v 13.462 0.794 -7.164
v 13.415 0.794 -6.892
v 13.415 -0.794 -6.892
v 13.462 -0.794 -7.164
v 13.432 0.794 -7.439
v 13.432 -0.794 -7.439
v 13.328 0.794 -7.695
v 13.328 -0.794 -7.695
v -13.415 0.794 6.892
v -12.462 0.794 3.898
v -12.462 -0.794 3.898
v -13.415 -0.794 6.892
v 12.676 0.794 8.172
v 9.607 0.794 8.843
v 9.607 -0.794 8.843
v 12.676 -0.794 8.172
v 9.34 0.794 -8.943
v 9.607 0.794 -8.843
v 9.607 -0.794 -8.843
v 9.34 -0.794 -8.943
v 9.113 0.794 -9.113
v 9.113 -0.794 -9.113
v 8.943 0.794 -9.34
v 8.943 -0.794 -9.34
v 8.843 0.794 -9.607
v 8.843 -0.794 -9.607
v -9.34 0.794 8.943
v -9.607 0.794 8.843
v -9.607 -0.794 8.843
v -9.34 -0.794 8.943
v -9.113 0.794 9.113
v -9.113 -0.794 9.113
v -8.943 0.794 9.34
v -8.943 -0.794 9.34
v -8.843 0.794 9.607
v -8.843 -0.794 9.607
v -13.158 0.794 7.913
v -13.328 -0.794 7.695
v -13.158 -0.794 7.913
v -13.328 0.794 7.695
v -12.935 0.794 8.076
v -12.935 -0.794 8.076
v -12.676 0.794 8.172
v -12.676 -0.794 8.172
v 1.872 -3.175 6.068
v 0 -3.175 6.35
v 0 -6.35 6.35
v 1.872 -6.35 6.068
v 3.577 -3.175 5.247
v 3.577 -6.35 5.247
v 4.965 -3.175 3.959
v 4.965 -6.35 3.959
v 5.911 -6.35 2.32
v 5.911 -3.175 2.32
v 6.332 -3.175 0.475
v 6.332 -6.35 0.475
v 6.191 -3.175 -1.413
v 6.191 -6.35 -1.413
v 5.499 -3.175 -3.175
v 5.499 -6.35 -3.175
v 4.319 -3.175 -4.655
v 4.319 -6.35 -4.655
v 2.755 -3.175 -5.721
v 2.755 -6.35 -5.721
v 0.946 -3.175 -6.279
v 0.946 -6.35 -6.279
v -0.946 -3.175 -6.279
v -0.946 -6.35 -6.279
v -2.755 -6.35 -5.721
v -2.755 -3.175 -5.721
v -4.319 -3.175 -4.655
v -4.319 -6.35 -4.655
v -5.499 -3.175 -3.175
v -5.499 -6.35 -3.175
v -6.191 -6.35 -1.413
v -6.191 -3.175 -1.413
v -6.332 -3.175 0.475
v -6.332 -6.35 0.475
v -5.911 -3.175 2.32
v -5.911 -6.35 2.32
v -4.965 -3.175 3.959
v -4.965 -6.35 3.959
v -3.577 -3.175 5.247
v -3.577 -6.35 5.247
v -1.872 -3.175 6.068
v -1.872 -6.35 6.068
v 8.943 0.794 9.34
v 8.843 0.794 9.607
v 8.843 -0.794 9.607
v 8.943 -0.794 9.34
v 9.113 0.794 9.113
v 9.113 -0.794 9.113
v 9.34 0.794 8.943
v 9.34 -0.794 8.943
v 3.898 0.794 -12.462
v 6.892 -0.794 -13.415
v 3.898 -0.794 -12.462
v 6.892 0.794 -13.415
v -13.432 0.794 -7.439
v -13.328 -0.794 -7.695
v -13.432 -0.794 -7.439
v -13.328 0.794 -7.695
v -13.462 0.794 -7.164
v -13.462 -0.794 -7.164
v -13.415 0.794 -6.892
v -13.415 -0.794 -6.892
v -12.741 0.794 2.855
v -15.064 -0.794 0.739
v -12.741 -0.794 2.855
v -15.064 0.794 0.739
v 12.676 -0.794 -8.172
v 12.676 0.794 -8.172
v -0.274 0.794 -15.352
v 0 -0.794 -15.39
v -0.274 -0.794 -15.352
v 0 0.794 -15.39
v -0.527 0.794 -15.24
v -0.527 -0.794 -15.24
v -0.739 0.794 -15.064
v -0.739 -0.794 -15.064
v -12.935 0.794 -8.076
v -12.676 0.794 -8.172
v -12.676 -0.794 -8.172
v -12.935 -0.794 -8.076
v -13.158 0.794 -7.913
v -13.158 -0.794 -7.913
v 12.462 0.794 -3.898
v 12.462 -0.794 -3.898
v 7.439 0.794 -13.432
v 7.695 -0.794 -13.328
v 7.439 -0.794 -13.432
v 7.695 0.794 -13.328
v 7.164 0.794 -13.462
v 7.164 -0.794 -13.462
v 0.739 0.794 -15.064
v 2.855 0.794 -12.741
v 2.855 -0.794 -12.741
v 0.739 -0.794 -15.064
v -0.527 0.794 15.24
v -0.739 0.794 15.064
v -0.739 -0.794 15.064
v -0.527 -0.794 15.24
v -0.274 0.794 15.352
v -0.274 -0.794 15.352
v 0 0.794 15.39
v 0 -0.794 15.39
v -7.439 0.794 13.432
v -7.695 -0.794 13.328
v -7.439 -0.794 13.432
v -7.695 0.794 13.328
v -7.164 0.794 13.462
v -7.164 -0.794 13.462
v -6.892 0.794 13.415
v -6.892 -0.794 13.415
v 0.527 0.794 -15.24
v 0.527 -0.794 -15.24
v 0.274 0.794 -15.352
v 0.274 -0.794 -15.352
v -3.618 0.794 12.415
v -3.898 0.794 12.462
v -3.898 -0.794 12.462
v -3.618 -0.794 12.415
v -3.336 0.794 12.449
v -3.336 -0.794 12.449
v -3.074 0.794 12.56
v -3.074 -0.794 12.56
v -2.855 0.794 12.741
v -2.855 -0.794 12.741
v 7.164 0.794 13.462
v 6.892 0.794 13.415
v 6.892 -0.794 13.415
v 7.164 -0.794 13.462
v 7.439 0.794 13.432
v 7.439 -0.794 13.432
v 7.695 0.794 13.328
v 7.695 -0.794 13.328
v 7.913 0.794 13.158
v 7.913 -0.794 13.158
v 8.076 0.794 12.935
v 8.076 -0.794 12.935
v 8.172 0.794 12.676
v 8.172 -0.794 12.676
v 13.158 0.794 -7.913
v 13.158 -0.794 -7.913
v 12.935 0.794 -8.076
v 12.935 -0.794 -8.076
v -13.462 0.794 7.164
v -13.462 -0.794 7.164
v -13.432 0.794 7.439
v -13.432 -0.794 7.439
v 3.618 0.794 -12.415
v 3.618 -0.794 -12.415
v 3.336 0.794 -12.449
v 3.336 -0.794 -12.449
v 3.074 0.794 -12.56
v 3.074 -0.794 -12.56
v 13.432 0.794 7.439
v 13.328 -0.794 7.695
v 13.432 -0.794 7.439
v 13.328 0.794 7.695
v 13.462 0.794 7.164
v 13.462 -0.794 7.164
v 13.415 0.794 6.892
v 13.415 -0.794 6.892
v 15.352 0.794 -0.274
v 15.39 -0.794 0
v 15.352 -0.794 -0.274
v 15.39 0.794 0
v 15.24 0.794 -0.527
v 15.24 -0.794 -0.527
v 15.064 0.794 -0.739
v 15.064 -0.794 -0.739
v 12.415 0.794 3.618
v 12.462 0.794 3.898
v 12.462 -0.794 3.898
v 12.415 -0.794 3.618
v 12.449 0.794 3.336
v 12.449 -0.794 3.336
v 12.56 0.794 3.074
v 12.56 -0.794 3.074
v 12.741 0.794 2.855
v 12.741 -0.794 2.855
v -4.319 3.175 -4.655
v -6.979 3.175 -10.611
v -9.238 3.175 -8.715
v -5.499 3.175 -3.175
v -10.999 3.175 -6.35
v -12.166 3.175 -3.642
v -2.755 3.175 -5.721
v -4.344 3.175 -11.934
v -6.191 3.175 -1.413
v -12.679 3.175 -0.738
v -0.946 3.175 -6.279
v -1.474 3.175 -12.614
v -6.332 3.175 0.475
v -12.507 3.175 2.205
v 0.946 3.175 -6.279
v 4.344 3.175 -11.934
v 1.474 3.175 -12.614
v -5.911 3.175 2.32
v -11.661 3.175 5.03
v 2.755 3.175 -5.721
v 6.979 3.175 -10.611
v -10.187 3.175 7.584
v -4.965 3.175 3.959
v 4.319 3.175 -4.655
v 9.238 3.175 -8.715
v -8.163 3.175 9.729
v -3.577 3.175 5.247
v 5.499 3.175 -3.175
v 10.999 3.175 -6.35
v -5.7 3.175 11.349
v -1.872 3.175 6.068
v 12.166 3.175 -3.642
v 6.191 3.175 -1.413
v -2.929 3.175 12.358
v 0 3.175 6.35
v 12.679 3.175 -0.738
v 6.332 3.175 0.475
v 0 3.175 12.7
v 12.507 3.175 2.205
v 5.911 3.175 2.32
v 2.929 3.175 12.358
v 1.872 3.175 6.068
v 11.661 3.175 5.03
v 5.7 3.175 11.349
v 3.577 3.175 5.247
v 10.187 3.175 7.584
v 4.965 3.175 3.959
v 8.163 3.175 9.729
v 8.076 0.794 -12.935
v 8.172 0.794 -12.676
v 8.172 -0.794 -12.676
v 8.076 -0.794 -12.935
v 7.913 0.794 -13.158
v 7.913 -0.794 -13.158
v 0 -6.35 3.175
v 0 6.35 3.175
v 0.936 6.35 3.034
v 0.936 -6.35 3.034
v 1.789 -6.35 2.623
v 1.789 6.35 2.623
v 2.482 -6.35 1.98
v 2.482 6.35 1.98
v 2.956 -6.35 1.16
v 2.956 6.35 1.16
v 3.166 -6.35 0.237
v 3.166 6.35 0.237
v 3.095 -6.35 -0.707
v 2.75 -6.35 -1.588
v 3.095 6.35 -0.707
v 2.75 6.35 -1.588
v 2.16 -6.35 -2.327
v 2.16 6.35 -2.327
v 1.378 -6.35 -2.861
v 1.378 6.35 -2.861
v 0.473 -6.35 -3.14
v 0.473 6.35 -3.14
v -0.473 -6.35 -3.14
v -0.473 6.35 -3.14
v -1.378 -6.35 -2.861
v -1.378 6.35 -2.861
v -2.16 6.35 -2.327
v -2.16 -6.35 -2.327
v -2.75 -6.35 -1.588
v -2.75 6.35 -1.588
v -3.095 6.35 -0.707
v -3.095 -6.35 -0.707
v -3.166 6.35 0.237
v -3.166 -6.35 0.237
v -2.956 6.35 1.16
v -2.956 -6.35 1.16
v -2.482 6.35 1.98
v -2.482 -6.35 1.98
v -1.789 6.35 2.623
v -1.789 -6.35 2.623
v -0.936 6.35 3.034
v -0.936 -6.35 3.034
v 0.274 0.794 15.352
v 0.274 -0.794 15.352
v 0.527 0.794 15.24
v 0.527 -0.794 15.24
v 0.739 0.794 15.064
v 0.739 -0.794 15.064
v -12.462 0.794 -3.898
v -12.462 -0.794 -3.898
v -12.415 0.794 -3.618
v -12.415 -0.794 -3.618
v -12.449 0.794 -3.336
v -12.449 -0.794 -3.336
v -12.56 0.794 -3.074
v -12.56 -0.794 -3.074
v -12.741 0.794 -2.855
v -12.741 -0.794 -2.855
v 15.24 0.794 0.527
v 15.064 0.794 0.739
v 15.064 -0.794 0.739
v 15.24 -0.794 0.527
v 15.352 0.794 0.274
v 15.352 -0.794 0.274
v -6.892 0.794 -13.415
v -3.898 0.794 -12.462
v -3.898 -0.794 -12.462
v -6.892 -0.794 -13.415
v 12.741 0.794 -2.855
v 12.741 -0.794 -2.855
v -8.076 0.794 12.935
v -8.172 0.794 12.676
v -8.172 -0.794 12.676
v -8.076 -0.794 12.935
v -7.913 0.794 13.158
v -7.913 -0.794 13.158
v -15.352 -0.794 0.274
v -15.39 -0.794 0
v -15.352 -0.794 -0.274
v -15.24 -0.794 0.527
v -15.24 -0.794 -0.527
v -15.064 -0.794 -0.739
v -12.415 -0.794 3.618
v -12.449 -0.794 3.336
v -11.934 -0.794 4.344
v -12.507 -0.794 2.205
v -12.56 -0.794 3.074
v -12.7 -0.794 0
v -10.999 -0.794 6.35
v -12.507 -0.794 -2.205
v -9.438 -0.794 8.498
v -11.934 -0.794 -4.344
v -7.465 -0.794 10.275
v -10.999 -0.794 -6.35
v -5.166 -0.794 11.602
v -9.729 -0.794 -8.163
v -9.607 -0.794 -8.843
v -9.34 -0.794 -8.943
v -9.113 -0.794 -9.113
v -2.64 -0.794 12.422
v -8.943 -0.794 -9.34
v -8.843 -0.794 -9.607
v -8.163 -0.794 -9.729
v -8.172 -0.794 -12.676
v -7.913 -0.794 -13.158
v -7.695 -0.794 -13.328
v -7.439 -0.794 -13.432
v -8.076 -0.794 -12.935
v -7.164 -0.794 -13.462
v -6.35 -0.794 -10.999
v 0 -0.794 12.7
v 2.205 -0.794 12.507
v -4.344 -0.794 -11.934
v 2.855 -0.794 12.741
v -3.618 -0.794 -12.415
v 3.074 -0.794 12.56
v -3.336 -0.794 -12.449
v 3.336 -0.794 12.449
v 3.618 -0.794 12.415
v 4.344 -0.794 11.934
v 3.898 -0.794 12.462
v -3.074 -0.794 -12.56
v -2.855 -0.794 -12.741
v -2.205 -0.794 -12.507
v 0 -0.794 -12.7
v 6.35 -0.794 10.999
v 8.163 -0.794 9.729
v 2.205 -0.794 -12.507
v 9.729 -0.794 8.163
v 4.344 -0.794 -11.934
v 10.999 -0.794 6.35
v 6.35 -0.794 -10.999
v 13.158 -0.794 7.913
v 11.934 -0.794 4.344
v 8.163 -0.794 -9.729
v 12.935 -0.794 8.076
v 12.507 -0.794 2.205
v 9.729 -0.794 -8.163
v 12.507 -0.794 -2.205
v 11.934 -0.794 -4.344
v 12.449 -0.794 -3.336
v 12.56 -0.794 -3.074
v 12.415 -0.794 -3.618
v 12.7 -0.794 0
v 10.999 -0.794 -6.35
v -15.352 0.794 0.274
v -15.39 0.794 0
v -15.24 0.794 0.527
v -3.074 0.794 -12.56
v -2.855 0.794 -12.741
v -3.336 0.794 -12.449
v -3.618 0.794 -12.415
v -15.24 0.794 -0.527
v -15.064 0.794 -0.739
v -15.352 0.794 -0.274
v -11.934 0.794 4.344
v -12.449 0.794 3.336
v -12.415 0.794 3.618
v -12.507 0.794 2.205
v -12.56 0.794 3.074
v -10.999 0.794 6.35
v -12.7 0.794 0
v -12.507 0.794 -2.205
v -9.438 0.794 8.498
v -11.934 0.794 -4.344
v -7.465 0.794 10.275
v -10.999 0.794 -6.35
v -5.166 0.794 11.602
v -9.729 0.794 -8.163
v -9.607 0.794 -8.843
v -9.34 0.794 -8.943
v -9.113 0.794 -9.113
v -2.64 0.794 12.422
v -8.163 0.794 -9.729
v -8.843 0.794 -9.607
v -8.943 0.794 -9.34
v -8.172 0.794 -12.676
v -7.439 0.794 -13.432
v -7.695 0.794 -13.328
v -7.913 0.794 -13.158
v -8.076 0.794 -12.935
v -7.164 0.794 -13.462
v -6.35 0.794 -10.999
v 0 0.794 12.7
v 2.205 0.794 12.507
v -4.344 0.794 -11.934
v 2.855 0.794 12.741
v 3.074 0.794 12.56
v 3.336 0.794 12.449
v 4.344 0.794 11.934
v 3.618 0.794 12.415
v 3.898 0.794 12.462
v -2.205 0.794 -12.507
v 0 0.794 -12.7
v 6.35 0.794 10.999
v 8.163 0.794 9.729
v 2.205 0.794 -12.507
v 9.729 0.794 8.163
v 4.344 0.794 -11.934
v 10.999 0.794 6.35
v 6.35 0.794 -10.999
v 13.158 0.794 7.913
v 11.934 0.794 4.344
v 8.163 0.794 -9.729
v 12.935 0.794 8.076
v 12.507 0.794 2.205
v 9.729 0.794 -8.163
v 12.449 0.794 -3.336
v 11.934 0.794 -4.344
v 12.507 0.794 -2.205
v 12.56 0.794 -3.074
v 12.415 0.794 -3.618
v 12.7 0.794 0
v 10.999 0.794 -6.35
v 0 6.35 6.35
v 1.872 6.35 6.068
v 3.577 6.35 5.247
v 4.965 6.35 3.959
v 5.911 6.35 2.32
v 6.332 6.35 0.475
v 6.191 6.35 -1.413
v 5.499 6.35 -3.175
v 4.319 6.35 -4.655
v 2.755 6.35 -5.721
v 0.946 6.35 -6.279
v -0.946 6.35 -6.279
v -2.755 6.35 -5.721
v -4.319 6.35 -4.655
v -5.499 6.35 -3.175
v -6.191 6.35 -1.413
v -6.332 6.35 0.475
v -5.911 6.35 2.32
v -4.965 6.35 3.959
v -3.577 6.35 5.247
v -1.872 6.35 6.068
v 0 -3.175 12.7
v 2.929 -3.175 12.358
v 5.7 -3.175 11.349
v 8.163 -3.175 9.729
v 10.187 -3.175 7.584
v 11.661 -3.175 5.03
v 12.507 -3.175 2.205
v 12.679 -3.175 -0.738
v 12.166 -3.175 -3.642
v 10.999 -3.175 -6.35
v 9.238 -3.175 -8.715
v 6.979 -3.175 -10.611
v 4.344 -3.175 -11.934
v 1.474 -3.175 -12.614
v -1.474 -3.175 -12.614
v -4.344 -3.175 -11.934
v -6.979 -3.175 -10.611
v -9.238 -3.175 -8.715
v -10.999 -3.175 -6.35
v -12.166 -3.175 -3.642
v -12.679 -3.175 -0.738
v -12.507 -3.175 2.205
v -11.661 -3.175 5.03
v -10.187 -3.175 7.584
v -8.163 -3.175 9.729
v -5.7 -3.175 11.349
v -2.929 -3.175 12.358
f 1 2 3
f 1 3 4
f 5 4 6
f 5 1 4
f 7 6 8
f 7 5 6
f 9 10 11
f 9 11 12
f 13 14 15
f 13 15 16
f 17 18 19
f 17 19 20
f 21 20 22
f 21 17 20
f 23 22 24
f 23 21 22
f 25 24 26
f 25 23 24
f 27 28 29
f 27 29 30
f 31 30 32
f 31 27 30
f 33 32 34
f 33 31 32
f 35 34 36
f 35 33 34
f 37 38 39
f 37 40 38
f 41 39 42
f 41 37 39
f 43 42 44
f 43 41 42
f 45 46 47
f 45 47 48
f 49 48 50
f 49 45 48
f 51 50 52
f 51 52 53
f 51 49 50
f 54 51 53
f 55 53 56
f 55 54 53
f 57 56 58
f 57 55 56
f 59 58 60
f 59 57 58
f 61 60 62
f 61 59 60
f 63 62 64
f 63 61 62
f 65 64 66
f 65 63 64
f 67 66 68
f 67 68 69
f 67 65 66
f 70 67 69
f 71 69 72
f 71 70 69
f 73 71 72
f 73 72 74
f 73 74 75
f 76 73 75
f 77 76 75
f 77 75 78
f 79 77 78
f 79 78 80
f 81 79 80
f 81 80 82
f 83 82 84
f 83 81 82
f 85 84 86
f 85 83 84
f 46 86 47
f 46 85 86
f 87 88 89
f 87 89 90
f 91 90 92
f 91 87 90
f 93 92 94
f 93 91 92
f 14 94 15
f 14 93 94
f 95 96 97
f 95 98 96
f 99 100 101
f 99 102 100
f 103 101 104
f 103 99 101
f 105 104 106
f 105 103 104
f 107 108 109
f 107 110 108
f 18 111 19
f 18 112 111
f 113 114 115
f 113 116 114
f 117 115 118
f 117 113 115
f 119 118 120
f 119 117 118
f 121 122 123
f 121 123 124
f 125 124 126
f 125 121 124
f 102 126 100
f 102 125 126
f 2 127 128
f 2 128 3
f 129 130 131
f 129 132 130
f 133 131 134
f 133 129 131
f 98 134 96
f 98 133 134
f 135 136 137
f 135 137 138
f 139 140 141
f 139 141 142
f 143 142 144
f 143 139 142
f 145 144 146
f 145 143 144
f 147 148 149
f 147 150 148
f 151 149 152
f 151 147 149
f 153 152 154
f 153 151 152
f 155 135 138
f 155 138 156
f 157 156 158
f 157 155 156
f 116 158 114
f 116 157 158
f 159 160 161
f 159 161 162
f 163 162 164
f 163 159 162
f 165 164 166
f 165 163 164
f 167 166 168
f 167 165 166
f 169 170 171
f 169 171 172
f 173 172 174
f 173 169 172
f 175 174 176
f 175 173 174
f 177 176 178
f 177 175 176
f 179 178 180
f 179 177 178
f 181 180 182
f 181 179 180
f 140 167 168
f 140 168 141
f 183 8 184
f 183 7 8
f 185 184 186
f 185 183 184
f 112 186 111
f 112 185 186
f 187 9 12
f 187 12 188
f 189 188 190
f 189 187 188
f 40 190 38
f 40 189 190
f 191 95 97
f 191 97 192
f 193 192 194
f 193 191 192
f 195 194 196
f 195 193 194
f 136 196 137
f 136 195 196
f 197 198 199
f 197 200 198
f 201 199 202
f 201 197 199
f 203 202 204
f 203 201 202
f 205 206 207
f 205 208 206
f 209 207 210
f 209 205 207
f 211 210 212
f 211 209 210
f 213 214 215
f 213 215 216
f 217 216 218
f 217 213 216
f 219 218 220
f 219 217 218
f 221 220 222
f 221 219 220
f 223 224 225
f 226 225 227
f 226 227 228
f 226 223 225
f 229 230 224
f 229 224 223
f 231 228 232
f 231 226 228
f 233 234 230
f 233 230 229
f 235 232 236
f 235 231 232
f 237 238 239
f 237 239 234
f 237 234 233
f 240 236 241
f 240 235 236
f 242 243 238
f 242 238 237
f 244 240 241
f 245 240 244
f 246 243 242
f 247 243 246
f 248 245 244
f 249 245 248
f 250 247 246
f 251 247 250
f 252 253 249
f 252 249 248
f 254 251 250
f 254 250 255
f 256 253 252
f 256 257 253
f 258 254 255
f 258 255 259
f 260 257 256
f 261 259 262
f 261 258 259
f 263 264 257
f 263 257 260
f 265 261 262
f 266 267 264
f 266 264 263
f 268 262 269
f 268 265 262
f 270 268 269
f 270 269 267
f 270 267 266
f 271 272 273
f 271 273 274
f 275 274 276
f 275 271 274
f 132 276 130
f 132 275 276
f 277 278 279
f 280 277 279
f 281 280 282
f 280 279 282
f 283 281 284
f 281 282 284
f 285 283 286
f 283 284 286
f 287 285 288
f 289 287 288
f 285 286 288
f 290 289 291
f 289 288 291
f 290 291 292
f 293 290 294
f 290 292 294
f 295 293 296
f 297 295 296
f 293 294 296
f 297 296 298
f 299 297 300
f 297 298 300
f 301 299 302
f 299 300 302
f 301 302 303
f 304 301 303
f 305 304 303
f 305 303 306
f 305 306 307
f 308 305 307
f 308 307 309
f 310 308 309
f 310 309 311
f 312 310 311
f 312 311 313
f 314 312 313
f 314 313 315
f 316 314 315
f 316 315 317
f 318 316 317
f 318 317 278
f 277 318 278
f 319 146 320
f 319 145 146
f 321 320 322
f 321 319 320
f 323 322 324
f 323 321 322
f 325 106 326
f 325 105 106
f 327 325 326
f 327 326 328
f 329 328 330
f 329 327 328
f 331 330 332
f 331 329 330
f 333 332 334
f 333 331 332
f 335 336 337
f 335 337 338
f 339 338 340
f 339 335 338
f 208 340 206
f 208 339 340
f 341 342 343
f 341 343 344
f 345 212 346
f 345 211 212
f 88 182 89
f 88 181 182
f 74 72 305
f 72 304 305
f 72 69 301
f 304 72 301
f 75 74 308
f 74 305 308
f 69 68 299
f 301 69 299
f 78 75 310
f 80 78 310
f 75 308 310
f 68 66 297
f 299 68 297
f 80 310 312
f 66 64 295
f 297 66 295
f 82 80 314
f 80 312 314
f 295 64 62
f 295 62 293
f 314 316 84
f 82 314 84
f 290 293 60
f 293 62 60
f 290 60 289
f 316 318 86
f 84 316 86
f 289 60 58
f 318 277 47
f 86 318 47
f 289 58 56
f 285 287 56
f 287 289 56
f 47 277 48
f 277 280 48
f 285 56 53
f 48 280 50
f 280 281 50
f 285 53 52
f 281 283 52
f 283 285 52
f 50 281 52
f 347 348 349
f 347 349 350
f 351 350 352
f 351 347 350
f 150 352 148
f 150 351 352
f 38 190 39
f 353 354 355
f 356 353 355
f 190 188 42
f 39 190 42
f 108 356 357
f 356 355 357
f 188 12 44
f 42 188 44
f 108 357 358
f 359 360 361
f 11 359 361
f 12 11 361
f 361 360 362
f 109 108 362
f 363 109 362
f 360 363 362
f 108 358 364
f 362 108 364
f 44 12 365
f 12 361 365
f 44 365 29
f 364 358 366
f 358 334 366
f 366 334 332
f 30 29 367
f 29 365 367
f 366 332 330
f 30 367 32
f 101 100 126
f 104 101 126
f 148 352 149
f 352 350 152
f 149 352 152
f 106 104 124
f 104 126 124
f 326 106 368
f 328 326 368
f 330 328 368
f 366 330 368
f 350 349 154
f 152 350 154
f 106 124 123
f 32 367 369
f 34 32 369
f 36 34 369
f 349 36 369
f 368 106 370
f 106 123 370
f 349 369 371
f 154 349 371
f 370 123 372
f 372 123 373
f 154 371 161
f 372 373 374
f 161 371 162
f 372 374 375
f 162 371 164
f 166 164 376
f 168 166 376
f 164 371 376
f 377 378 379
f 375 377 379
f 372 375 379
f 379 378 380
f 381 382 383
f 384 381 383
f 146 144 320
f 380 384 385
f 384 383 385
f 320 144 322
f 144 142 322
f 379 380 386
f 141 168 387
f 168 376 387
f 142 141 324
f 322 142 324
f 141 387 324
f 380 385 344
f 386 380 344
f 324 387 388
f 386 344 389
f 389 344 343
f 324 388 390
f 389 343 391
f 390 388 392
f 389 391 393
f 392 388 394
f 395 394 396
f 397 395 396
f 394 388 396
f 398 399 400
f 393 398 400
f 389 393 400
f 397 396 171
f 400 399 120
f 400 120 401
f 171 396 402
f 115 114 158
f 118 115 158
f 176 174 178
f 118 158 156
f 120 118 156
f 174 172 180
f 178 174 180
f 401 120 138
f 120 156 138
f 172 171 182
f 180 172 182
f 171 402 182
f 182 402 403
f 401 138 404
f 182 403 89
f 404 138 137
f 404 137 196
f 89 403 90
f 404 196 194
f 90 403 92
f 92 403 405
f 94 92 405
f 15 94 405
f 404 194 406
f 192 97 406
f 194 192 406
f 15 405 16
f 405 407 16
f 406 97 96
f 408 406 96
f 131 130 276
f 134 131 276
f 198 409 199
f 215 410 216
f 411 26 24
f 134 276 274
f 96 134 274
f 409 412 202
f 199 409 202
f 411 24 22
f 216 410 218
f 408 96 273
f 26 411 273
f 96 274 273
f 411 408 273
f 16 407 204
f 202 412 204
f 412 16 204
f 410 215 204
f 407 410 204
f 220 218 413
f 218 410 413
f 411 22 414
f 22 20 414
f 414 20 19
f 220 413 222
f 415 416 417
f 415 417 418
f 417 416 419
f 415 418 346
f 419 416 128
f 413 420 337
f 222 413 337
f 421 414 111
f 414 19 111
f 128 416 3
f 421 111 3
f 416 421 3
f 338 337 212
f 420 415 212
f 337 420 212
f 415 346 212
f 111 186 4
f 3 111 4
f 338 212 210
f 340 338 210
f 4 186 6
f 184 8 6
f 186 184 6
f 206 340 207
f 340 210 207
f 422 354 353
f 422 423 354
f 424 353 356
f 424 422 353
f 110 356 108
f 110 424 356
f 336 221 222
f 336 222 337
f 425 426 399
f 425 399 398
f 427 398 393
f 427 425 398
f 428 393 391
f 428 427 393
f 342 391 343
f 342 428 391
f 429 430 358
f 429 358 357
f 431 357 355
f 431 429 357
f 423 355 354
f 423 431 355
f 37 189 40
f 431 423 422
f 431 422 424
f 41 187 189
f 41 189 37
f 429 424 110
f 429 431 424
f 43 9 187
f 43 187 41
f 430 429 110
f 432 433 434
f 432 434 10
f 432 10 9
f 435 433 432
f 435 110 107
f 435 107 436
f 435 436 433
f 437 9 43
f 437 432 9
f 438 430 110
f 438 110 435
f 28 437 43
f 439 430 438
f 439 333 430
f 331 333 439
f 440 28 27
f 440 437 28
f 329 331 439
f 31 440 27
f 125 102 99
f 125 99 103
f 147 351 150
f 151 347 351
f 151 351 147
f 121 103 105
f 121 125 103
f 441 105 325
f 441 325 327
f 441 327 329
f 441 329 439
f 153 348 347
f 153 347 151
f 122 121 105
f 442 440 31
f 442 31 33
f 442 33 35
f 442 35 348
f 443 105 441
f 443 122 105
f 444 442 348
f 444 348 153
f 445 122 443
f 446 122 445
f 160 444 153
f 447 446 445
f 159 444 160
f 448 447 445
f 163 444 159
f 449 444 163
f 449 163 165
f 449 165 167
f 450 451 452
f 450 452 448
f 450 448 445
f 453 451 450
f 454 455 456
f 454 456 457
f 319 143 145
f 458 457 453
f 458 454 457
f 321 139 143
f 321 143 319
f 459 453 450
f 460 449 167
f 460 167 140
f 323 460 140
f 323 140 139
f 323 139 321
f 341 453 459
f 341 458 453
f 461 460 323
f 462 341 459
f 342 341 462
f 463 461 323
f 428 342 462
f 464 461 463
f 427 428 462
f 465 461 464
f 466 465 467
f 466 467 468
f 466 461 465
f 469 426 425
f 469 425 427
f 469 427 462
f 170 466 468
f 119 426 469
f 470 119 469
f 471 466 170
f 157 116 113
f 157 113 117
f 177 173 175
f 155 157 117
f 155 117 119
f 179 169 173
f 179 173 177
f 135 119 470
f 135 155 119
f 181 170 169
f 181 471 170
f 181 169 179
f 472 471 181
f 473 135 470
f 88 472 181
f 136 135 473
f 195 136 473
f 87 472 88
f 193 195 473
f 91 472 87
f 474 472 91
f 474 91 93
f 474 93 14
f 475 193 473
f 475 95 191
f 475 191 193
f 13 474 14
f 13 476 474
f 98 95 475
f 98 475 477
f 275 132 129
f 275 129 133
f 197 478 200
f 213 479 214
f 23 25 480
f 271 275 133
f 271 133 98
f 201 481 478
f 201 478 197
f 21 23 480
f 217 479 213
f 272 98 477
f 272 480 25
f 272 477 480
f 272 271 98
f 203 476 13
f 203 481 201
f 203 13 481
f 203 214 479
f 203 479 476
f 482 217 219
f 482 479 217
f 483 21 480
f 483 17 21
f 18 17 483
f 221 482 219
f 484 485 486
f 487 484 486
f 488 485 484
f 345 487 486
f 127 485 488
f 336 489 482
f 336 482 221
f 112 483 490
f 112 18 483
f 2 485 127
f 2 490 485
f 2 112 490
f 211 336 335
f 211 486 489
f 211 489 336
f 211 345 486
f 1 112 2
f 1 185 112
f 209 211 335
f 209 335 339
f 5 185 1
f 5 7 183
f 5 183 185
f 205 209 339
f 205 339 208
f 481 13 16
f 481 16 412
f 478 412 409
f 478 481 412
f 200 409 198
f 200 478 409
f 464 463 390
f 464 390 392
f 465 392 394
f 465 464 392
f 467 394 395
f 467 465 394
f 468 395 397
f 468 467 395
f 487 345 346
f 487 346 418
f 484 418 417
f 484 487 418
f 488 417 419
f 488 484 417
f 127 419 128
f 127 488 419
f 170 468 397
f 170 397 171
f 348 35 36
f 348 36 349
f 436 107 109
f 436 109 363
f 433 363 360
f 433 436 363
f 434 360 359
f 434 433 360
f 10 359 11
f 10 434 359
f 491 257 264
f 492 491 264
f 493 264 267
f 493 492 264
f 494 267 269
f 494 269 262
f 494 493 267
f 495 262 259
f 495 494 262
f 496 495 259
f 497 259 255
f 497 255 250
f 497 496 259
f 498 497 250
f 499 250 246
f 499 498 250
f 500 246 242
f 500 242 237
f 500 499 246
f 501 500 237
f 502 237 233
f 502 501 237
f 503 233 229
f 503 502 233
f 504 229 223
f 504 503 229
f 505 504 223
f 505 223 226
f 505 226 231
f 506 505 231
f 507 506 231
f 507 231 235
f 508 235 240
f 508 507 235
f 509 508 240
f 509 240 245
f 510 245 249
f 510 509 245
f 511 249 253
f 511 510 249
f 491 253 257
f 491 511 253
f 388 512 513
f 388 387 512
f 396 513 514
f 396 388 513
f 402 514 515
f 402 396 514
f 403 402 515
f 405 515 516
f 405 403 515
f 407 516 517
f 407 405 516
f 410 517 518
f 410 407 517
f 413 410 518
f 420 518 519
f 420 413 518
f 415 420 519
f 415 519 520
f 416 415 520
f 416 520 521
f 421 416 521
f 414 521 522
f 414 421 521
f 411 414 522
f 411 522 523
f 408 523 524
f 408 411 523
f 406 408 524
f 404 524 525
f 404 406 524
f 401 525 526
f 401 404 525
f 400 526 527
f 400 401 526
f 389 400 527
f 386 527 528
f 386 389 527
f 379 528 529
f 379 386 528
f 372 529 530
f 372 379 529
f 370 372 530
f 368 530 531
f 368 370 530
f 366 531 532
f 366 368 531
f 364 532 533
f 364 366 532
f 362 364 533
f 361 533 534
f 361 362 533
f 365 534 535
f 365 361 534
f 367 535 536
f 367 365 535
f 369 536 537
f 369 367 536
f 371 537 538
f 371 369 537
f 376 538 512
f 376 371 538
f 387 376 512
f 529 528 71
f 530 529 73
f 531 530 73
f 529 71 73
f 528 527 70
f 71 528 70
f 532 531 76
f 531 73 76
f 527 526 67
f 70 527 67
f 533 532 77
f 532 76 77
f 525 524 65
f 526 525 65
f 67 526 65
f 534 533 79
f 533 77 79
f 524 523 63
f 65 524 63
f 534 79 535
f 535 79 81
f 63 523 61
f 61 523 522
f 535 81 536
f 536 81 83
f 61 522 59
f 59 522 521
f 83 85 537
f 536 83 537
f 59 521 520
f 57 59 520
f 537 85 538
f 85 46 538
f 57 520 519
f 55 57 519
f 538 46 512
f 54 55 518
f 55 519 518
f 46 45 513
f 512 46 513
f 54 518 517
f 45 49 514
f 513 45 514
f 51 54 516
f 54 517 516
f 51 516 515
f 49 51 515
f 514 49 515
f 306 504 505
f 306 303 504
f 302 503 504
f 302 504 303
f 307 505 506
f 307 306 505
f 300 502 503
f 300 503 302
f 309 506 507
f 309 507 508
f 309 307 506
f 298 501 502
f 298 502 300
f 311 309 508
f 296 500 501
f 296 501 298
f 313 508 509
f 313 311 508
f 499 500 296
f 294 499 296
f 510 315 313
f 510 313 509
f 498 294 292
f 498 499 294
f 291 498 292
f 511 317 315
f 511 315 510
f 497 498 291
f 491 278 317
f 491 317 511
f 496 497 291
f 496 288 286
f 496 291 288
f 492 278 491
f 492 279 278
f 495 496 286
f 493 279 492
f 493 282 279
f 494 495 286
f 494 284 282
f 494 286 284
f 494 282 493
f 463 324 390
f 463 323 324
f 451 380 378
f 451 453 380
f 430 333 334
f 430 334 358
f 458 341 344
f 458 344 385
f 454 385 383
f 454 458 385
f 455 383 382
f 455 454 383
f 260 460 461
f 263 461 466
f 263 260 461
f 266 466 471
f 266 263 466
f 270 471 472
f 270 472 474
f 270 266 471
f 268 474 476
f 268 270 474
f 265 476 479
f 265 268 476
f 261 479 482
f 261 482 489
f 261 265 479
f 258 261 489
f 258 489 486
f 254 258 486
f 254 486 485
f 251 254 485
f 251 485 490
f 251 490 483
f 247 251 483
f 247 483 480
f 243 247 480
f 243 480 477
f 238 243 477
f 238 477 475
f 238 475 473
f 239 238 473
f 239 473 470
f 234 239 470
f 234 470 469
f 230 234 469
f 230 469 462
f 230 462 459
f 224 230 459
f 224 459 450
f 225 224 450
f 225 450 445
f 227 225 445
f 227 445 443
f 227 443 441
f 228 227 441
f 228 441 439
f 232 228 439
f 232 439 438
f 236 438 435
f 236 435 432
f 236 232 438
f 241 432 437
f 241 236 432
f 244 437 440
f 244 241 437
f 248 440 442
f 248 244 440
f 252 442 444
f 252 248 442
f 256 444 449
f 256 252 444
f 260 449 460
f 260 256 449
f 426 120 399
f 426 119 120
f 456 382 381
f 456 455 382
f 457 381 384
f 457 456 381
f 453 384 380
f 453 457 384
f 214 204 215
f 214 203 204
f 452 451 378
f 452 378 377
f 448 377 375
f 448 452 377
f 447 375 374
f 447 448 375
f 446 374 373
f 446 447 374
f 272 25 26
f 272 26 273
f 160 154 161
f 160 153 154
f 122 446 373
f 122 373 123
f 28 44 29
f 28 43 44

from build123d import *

# Parameters (mm, degrees)
SKETCH1_R           = 6.35
BOSS_EXTRUDE1_DEPTH = 6.35
SKETCH2_R           = 12.7
BOSS_EXTRUDE2_DEPTH = 3.175
BOSS_EXTRUDE3_DEPTH = 0.79375
CIRPATTERN1_COUNT   = 12
SKETCH4_R           = 3.175
CUT_EXTRUDE1_DEPTH  = 26.19931616


with BuildPart() as part:
    # Sketch1 → Boss-Extrude1 (new, symmetric)
    with BuildSketch(Plane(origin=(0, 0, 0), x_dir=(1, 0, 0), z_dir=(0, 1, 0))):
        with Locations(Location((0, 0, 0), (0, 0, 270))):
            Circle(SKETCH1_R)
    extrude(amount=BOSS_EXTRUDE1_DEPTH, both=True)

    # Sketch2 → Boss-Extrude2 (add, symmetric)
    with BuildSketch(Plane(origin=(0, 0, 0), x_dir=(1, 0, 0), z_dir=(0, 1, 0))):
        with Locations(Location((0, 0, 0), (0, 0, 270))):
            Circle(SKETCH2_R)
    extrude(amount=BOSS_EXTRUDE2_DEPTH, both=True)

    # Sketch3 → Boss-Extrude3 (add, symmetric)
    with BuildSketch(Plane(origin=(0, 0, 0), x_dir=(1, 0, 0), z_dir=(0, 1, 0))):
        with BuildLine():
            Line((-6.891666757, -13.415120246), (-3.89786608, -12.461780366))
            ThreePointArc((-3.89786608, -12.461780366), (-3.335621729, -12.448709767), (-2.855239137, -12.741151414))
            Line((-2.855239137, -12.741151414), (-0.739201637, -15.063668306))
            ThreePointArc((-0.739201637, -15.063668306), (-0.404051866, -15.304920203), (0, -15.390184127))
            Line((0, -15.390184127), (0, -12.7))
            Line((0, -12.7), (-6.35, -10.998522628))
            Line((-6.35, -10.998522628), (-7.695092063, -13.328290423))
            ThreePointArc((-7.695092063, -13.328290423), (-7.302540921, -13.456475632), (-6.891666757, -13.415120246))
        make_face()
    boss_extrude3 = extrude(amount=BOSS_EXTRUDE3_DEPTH, both=True)

    # CirPattern1: Boss-Extrude3 ×12 about axis
    cirpattern1_axis = Axis((0, 0, 0), (0, 1, 0))
    for i in range(1, CIRPATTERN1_COUNT):
        add(boss_extrude3.rotate(cirpattern1_axis, i * 360 / CIRPATTERN1_COUNT))

    # Sketch4 → Cut-Extrude1 (cut, through all)
    with BuildSketch(Plane(origin=(0, 6.35, 0), x_dir=(1, 0, 0), z_dir=(0, 1, 0))):
        with Locations(Location((0, 0, 0), (0, 0, 270))):
            Circle(SKETCH4_R)
    extrude(amount=-CUT_EXTRUDE1_DEPTH, mode=Mode.SUBTRACT)


solid = part.part
